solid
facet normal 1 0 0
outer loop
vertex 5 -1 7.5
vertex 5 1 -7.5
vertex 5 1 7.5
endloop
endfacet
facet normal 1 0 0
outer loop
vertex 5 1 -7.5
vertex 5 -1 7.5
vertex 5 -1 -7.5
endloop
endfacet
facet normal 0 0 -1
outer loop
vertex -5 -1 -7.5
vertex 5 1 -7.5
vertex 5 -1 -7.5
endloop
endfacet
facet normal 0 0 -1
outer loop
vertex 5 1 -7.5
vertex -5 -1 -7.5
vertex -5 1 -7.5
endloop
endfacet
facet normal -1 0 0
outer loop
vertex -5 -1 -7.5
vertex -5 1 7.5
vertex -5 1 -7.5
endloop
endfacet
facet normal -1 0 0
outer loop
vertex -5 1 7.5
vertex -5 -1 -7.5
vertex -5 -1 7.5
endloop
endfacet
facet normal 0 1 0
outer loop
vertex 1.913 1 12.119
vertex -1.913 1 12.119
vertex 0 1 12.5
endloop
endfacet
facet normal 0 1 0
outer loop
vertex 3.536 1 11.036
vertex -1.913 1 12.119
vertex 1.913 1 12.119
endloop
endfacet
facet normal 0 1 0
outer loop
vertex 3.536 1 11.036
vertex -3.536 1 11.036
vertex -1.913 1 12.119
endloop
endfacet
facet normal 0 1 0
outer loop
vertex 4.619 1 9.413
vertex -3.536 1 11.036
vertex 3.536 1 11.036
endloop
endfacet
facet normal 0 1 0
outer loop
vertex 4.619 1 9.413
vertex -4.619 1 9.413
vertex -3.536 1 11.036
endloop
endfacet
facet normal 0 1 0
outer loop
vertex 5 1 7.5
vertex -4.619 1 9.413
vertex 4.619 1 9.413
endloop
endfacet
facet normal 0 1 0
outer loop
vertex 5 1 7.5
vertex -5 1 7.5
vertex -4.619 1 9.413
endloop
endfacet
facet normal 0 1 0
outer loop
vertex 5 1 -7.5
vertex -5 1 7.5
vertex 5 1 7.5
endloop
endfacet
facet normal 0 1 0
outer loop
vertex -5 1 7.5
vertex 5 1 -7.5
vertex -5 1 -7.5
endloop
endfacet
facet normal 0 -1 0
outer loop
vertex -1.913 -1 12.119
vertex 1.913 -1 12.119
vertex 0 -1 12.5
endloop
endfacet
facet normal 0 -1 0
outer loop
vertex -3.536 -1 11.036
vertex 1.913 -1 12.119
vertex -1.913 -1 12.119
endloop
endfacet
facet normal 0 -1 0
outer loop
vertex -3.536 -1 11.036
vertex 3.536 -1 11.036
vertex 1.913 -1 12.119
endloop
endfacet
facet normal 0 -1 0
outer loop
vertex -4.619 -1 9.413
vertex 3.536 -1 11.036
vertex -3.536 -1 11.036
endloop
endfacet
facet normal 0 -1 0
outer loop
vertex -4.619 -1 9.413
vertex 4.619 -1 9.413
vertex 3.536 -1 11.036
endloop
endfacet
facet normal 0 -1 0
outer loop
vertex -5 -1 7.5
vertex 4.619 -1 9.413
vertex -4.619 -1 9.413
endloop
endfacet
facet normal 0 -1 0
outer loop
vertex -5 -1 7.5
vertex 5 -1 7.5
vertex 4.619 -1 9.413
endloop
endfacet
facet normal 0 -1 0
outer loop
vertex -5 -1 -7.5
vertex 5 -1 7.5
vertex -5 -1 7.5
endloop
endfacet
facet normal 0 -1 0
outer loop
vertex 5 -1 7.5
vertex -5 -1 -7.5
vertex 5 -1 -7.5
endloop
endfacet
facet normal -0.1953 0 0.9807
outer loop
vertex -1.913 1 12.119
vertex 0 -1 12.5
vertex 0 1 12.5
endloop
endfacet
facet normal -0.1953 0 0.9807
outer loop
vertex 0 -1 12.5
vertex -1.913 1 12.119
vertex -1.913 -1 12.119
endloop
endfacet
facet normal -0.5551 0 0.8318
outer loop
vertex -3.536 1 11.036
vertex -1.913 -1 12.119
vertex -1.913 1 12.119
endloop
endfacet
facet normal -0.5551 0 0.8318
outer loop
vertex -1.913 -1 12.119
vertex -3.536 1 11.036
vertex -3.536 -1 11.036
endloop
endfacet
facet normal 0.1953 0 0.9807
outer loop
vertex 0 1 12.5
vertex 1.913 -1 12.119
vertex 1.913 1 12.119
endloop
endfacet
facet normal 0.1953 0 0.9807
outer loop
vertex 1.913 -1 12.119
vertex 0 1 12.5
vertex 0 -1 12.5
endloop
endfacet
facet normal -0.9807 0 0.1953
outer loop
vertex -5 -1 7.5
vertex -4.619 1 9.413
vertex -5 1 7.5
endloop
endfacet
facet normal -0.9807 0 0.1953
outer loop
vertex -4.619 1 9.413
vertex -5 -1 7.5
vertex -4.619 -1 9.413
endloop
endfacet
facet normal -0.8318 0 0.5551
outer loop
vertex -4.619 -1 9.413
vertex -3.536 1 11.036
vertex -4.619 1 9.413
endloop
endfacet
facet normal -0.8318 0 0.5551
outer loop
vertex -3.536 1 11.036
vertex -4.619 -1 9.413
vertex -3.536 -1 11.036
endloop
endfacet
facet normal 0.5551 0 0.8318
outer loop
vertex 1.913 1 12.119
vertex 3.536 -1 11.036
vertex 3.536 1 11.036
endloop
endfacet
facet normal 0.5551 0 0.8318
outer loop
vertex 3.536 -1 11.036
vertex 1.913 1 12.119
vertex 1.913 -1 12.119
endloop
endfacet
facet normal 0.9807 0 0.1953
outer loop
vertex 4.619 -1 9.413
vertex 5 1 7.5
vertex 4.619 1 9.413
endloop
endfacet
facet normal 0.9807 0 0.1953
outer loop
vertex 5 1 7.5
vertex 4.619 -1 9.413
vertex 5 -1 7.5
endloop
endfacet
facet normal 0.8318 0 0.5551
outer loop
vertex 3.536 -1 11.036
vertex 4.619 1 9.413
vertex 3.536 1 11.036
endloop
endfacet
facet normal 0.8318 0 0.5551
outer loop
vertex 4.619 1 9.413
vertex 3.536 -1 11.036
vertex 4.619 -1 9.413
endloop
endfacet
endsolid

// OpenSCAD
//
//translate([0,0,1]) cylinder(r1 = 5, r2 = 4, h = 1, center = true, $fn = 30)  ;
//cylinder(r = 5, h = 1, center = true, $fn= 30);
//translate([0,0,-1]) cylinder(r2 = 5, r1 = 4, h = 1, center = true, $fn = 30);


 module kickboard(width, depth, height) {
        union() {
            cube([width, depth, height - width/2], center = true);
            translate([0,0, (height - width/2) / 2]) {
                rotate([0, 90, 90]) {
                    cylinder(r = width/2, h = depth, center = true);
                }
            }
        }
    }


kickboard(10, 2, 20);
